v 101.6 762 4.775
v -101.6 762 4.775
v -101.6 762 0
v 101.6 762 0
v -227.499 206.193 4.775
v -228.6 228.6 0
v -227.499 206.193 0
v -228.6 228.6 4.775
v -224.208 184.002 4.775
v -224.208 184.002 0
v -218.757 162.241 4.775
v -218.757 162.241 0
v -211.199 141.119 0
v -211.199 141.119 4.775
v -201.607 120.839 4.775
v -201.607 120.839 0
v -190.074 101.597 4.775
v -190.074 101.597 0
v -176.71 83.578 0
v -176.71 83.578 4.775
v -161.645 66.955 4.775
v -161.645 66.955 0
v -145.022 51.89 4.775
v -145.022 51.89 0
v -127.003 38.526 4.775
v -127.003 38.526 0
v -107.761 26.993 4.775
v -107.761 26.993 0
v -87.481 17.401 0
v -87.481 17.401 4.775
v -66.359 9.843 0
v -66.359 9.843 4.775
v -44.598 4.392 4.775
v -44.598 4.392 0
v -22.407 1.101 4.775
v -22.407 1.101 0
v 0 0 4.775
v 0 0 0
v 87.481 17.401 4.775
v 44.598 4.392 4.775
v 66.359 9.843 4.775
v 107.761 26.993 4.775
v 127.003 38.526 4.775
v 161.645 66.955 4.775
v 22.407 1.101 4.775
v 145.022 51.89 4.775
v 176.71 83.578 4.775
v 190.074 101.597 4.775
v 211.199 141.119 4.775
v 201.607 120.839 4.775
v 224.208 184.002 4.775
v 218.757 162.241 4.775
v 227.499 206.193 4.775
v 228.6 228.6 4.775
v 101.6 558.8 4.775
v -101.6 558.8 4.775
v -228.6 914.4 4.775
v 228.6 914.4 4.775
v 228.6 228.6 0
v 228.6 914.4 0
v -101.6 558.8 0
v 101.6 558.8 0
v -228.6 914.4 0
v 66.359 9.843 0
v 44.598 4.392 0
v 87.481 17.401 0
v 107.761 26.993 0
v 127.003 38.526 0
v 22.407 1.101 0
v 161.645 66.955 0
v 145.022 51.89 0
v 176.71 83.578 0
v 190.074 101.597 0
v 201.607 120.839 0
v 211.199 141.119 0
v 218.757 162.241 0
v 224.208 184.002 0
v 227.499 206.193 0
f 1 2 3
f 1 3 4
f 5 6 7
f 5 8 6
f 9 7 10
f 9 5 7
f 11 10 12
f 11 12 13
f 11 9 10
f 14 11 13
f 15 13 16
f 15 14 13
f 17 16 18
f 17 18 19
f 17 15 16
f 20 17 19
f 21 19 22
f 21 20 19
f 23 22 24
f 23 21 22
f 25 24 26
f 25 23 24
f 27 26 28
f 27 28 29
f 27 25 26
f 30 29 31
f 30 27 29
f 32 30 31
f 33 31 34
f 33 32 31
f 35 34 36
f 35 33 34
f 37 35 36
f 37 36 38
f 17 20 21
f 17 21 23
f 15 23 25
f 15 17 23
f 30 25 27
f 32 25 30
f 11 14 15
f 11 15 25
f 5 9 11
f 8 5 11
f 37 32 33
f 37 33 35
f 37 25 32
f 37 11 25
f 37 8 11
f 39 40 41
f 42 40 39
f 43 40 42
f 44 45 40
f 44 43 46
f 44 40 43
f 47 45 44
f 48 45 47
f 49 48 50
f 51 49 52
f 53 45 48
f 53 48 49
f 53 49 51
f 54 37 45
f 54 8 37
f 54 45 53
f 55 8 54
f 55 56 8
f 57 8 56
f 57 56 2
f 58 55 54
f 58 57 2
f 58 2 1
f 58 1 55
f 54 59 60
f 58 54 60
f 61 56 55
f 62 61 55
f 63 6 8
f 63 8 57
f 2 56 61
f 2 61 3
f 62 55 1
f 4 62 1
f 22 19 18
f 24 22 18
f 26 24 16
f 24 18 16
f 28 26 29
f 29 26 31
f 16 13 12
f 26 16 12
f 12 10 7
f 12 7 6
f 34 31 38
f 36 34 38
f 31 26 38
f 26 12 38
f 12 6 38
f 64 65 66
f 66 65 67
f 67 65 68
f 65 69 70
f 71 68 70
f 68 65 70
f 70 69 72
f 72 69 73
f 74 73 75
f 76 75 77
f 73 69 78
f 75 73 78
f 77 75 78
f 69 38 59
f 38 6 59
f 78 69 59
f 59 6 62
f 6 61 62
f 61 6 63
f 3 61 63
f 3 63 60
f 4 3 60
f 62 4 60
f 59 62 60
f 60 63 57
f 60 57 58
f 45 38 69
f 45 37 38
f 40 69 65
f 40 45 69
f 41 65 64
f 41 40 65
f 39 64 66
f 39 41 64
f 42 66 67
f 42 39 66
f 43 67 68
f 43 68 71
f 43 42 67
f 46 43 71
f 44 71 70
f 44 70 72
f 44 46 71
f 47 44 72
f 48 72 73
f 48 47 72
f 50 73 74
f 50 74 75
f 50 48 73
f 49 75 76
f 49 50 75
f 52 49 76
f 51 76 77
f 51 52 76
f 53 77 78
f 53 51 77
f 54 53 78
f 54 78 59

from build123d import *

# Parameters (mm, degrees)
F0_W     = 457.2
F0_H     = 914.4
F1_DEPTH = 4.7752
F2_R     = 228.59999
F3_W     = 203.2
F3_H     = 203.2
F4_DEPTH = 25.399999693


# Not quite as in the source:
# - a fillet or chamfer is up to 0.001 mm smaller than in the source, because OpenCascade refuses the exact size
# - ends of sketch curves that miss each other by under 0.0002 mm in the source are joined


with BuildPart() as f1:
    # F0 (on Top) → F1 (new body)
    with BuildSketch(Plane.XY):
        with Locations((0, 457.2)):
            Rectangle(F0_W, F0_H)
    extrude(amount=F1_DEPTH)

    # F2 (radius 228.6 in the source; OpenCascade refuses exactly that, so slightly less here)
    f2_edges = [f1.edges().sort_by_distance(p)[0] for p in [
        (228.6, 0, 2.3876),
        (-228.6, 0, 2.3876),
    ]]
    fillet(f2_edges, radius=F2_R)

    # F3 (on face) → F4 (intersect)
    with BuildSketch(Plane.XY.offset(4.7752)):
        with BuildLine():
            Line((-228.6, 914.4), (-228.6, 228.59999))
            ThreePointArc((-228.6, 228.59999), (-161.6446131082, 66.9553868918), (-1e-05, 0))
            ThreePointArc((-1e-05, 0), (161.6446131082, 66.9553868918), (228.6, 228.59999))
            Line((228.6, 228.59999), (228.6, 914.4))
            Line((228.6, 914.4), (-228.6, 914.4))
        make_face()
        with Locations((0, 660.4)):
            Rectangle(F3_W, F3_H, mode=Mode.SUBTRACT)
    extrude(amount=-F4_DEPTH, mode=Mode.INTERSECT)


solid = f1.part
